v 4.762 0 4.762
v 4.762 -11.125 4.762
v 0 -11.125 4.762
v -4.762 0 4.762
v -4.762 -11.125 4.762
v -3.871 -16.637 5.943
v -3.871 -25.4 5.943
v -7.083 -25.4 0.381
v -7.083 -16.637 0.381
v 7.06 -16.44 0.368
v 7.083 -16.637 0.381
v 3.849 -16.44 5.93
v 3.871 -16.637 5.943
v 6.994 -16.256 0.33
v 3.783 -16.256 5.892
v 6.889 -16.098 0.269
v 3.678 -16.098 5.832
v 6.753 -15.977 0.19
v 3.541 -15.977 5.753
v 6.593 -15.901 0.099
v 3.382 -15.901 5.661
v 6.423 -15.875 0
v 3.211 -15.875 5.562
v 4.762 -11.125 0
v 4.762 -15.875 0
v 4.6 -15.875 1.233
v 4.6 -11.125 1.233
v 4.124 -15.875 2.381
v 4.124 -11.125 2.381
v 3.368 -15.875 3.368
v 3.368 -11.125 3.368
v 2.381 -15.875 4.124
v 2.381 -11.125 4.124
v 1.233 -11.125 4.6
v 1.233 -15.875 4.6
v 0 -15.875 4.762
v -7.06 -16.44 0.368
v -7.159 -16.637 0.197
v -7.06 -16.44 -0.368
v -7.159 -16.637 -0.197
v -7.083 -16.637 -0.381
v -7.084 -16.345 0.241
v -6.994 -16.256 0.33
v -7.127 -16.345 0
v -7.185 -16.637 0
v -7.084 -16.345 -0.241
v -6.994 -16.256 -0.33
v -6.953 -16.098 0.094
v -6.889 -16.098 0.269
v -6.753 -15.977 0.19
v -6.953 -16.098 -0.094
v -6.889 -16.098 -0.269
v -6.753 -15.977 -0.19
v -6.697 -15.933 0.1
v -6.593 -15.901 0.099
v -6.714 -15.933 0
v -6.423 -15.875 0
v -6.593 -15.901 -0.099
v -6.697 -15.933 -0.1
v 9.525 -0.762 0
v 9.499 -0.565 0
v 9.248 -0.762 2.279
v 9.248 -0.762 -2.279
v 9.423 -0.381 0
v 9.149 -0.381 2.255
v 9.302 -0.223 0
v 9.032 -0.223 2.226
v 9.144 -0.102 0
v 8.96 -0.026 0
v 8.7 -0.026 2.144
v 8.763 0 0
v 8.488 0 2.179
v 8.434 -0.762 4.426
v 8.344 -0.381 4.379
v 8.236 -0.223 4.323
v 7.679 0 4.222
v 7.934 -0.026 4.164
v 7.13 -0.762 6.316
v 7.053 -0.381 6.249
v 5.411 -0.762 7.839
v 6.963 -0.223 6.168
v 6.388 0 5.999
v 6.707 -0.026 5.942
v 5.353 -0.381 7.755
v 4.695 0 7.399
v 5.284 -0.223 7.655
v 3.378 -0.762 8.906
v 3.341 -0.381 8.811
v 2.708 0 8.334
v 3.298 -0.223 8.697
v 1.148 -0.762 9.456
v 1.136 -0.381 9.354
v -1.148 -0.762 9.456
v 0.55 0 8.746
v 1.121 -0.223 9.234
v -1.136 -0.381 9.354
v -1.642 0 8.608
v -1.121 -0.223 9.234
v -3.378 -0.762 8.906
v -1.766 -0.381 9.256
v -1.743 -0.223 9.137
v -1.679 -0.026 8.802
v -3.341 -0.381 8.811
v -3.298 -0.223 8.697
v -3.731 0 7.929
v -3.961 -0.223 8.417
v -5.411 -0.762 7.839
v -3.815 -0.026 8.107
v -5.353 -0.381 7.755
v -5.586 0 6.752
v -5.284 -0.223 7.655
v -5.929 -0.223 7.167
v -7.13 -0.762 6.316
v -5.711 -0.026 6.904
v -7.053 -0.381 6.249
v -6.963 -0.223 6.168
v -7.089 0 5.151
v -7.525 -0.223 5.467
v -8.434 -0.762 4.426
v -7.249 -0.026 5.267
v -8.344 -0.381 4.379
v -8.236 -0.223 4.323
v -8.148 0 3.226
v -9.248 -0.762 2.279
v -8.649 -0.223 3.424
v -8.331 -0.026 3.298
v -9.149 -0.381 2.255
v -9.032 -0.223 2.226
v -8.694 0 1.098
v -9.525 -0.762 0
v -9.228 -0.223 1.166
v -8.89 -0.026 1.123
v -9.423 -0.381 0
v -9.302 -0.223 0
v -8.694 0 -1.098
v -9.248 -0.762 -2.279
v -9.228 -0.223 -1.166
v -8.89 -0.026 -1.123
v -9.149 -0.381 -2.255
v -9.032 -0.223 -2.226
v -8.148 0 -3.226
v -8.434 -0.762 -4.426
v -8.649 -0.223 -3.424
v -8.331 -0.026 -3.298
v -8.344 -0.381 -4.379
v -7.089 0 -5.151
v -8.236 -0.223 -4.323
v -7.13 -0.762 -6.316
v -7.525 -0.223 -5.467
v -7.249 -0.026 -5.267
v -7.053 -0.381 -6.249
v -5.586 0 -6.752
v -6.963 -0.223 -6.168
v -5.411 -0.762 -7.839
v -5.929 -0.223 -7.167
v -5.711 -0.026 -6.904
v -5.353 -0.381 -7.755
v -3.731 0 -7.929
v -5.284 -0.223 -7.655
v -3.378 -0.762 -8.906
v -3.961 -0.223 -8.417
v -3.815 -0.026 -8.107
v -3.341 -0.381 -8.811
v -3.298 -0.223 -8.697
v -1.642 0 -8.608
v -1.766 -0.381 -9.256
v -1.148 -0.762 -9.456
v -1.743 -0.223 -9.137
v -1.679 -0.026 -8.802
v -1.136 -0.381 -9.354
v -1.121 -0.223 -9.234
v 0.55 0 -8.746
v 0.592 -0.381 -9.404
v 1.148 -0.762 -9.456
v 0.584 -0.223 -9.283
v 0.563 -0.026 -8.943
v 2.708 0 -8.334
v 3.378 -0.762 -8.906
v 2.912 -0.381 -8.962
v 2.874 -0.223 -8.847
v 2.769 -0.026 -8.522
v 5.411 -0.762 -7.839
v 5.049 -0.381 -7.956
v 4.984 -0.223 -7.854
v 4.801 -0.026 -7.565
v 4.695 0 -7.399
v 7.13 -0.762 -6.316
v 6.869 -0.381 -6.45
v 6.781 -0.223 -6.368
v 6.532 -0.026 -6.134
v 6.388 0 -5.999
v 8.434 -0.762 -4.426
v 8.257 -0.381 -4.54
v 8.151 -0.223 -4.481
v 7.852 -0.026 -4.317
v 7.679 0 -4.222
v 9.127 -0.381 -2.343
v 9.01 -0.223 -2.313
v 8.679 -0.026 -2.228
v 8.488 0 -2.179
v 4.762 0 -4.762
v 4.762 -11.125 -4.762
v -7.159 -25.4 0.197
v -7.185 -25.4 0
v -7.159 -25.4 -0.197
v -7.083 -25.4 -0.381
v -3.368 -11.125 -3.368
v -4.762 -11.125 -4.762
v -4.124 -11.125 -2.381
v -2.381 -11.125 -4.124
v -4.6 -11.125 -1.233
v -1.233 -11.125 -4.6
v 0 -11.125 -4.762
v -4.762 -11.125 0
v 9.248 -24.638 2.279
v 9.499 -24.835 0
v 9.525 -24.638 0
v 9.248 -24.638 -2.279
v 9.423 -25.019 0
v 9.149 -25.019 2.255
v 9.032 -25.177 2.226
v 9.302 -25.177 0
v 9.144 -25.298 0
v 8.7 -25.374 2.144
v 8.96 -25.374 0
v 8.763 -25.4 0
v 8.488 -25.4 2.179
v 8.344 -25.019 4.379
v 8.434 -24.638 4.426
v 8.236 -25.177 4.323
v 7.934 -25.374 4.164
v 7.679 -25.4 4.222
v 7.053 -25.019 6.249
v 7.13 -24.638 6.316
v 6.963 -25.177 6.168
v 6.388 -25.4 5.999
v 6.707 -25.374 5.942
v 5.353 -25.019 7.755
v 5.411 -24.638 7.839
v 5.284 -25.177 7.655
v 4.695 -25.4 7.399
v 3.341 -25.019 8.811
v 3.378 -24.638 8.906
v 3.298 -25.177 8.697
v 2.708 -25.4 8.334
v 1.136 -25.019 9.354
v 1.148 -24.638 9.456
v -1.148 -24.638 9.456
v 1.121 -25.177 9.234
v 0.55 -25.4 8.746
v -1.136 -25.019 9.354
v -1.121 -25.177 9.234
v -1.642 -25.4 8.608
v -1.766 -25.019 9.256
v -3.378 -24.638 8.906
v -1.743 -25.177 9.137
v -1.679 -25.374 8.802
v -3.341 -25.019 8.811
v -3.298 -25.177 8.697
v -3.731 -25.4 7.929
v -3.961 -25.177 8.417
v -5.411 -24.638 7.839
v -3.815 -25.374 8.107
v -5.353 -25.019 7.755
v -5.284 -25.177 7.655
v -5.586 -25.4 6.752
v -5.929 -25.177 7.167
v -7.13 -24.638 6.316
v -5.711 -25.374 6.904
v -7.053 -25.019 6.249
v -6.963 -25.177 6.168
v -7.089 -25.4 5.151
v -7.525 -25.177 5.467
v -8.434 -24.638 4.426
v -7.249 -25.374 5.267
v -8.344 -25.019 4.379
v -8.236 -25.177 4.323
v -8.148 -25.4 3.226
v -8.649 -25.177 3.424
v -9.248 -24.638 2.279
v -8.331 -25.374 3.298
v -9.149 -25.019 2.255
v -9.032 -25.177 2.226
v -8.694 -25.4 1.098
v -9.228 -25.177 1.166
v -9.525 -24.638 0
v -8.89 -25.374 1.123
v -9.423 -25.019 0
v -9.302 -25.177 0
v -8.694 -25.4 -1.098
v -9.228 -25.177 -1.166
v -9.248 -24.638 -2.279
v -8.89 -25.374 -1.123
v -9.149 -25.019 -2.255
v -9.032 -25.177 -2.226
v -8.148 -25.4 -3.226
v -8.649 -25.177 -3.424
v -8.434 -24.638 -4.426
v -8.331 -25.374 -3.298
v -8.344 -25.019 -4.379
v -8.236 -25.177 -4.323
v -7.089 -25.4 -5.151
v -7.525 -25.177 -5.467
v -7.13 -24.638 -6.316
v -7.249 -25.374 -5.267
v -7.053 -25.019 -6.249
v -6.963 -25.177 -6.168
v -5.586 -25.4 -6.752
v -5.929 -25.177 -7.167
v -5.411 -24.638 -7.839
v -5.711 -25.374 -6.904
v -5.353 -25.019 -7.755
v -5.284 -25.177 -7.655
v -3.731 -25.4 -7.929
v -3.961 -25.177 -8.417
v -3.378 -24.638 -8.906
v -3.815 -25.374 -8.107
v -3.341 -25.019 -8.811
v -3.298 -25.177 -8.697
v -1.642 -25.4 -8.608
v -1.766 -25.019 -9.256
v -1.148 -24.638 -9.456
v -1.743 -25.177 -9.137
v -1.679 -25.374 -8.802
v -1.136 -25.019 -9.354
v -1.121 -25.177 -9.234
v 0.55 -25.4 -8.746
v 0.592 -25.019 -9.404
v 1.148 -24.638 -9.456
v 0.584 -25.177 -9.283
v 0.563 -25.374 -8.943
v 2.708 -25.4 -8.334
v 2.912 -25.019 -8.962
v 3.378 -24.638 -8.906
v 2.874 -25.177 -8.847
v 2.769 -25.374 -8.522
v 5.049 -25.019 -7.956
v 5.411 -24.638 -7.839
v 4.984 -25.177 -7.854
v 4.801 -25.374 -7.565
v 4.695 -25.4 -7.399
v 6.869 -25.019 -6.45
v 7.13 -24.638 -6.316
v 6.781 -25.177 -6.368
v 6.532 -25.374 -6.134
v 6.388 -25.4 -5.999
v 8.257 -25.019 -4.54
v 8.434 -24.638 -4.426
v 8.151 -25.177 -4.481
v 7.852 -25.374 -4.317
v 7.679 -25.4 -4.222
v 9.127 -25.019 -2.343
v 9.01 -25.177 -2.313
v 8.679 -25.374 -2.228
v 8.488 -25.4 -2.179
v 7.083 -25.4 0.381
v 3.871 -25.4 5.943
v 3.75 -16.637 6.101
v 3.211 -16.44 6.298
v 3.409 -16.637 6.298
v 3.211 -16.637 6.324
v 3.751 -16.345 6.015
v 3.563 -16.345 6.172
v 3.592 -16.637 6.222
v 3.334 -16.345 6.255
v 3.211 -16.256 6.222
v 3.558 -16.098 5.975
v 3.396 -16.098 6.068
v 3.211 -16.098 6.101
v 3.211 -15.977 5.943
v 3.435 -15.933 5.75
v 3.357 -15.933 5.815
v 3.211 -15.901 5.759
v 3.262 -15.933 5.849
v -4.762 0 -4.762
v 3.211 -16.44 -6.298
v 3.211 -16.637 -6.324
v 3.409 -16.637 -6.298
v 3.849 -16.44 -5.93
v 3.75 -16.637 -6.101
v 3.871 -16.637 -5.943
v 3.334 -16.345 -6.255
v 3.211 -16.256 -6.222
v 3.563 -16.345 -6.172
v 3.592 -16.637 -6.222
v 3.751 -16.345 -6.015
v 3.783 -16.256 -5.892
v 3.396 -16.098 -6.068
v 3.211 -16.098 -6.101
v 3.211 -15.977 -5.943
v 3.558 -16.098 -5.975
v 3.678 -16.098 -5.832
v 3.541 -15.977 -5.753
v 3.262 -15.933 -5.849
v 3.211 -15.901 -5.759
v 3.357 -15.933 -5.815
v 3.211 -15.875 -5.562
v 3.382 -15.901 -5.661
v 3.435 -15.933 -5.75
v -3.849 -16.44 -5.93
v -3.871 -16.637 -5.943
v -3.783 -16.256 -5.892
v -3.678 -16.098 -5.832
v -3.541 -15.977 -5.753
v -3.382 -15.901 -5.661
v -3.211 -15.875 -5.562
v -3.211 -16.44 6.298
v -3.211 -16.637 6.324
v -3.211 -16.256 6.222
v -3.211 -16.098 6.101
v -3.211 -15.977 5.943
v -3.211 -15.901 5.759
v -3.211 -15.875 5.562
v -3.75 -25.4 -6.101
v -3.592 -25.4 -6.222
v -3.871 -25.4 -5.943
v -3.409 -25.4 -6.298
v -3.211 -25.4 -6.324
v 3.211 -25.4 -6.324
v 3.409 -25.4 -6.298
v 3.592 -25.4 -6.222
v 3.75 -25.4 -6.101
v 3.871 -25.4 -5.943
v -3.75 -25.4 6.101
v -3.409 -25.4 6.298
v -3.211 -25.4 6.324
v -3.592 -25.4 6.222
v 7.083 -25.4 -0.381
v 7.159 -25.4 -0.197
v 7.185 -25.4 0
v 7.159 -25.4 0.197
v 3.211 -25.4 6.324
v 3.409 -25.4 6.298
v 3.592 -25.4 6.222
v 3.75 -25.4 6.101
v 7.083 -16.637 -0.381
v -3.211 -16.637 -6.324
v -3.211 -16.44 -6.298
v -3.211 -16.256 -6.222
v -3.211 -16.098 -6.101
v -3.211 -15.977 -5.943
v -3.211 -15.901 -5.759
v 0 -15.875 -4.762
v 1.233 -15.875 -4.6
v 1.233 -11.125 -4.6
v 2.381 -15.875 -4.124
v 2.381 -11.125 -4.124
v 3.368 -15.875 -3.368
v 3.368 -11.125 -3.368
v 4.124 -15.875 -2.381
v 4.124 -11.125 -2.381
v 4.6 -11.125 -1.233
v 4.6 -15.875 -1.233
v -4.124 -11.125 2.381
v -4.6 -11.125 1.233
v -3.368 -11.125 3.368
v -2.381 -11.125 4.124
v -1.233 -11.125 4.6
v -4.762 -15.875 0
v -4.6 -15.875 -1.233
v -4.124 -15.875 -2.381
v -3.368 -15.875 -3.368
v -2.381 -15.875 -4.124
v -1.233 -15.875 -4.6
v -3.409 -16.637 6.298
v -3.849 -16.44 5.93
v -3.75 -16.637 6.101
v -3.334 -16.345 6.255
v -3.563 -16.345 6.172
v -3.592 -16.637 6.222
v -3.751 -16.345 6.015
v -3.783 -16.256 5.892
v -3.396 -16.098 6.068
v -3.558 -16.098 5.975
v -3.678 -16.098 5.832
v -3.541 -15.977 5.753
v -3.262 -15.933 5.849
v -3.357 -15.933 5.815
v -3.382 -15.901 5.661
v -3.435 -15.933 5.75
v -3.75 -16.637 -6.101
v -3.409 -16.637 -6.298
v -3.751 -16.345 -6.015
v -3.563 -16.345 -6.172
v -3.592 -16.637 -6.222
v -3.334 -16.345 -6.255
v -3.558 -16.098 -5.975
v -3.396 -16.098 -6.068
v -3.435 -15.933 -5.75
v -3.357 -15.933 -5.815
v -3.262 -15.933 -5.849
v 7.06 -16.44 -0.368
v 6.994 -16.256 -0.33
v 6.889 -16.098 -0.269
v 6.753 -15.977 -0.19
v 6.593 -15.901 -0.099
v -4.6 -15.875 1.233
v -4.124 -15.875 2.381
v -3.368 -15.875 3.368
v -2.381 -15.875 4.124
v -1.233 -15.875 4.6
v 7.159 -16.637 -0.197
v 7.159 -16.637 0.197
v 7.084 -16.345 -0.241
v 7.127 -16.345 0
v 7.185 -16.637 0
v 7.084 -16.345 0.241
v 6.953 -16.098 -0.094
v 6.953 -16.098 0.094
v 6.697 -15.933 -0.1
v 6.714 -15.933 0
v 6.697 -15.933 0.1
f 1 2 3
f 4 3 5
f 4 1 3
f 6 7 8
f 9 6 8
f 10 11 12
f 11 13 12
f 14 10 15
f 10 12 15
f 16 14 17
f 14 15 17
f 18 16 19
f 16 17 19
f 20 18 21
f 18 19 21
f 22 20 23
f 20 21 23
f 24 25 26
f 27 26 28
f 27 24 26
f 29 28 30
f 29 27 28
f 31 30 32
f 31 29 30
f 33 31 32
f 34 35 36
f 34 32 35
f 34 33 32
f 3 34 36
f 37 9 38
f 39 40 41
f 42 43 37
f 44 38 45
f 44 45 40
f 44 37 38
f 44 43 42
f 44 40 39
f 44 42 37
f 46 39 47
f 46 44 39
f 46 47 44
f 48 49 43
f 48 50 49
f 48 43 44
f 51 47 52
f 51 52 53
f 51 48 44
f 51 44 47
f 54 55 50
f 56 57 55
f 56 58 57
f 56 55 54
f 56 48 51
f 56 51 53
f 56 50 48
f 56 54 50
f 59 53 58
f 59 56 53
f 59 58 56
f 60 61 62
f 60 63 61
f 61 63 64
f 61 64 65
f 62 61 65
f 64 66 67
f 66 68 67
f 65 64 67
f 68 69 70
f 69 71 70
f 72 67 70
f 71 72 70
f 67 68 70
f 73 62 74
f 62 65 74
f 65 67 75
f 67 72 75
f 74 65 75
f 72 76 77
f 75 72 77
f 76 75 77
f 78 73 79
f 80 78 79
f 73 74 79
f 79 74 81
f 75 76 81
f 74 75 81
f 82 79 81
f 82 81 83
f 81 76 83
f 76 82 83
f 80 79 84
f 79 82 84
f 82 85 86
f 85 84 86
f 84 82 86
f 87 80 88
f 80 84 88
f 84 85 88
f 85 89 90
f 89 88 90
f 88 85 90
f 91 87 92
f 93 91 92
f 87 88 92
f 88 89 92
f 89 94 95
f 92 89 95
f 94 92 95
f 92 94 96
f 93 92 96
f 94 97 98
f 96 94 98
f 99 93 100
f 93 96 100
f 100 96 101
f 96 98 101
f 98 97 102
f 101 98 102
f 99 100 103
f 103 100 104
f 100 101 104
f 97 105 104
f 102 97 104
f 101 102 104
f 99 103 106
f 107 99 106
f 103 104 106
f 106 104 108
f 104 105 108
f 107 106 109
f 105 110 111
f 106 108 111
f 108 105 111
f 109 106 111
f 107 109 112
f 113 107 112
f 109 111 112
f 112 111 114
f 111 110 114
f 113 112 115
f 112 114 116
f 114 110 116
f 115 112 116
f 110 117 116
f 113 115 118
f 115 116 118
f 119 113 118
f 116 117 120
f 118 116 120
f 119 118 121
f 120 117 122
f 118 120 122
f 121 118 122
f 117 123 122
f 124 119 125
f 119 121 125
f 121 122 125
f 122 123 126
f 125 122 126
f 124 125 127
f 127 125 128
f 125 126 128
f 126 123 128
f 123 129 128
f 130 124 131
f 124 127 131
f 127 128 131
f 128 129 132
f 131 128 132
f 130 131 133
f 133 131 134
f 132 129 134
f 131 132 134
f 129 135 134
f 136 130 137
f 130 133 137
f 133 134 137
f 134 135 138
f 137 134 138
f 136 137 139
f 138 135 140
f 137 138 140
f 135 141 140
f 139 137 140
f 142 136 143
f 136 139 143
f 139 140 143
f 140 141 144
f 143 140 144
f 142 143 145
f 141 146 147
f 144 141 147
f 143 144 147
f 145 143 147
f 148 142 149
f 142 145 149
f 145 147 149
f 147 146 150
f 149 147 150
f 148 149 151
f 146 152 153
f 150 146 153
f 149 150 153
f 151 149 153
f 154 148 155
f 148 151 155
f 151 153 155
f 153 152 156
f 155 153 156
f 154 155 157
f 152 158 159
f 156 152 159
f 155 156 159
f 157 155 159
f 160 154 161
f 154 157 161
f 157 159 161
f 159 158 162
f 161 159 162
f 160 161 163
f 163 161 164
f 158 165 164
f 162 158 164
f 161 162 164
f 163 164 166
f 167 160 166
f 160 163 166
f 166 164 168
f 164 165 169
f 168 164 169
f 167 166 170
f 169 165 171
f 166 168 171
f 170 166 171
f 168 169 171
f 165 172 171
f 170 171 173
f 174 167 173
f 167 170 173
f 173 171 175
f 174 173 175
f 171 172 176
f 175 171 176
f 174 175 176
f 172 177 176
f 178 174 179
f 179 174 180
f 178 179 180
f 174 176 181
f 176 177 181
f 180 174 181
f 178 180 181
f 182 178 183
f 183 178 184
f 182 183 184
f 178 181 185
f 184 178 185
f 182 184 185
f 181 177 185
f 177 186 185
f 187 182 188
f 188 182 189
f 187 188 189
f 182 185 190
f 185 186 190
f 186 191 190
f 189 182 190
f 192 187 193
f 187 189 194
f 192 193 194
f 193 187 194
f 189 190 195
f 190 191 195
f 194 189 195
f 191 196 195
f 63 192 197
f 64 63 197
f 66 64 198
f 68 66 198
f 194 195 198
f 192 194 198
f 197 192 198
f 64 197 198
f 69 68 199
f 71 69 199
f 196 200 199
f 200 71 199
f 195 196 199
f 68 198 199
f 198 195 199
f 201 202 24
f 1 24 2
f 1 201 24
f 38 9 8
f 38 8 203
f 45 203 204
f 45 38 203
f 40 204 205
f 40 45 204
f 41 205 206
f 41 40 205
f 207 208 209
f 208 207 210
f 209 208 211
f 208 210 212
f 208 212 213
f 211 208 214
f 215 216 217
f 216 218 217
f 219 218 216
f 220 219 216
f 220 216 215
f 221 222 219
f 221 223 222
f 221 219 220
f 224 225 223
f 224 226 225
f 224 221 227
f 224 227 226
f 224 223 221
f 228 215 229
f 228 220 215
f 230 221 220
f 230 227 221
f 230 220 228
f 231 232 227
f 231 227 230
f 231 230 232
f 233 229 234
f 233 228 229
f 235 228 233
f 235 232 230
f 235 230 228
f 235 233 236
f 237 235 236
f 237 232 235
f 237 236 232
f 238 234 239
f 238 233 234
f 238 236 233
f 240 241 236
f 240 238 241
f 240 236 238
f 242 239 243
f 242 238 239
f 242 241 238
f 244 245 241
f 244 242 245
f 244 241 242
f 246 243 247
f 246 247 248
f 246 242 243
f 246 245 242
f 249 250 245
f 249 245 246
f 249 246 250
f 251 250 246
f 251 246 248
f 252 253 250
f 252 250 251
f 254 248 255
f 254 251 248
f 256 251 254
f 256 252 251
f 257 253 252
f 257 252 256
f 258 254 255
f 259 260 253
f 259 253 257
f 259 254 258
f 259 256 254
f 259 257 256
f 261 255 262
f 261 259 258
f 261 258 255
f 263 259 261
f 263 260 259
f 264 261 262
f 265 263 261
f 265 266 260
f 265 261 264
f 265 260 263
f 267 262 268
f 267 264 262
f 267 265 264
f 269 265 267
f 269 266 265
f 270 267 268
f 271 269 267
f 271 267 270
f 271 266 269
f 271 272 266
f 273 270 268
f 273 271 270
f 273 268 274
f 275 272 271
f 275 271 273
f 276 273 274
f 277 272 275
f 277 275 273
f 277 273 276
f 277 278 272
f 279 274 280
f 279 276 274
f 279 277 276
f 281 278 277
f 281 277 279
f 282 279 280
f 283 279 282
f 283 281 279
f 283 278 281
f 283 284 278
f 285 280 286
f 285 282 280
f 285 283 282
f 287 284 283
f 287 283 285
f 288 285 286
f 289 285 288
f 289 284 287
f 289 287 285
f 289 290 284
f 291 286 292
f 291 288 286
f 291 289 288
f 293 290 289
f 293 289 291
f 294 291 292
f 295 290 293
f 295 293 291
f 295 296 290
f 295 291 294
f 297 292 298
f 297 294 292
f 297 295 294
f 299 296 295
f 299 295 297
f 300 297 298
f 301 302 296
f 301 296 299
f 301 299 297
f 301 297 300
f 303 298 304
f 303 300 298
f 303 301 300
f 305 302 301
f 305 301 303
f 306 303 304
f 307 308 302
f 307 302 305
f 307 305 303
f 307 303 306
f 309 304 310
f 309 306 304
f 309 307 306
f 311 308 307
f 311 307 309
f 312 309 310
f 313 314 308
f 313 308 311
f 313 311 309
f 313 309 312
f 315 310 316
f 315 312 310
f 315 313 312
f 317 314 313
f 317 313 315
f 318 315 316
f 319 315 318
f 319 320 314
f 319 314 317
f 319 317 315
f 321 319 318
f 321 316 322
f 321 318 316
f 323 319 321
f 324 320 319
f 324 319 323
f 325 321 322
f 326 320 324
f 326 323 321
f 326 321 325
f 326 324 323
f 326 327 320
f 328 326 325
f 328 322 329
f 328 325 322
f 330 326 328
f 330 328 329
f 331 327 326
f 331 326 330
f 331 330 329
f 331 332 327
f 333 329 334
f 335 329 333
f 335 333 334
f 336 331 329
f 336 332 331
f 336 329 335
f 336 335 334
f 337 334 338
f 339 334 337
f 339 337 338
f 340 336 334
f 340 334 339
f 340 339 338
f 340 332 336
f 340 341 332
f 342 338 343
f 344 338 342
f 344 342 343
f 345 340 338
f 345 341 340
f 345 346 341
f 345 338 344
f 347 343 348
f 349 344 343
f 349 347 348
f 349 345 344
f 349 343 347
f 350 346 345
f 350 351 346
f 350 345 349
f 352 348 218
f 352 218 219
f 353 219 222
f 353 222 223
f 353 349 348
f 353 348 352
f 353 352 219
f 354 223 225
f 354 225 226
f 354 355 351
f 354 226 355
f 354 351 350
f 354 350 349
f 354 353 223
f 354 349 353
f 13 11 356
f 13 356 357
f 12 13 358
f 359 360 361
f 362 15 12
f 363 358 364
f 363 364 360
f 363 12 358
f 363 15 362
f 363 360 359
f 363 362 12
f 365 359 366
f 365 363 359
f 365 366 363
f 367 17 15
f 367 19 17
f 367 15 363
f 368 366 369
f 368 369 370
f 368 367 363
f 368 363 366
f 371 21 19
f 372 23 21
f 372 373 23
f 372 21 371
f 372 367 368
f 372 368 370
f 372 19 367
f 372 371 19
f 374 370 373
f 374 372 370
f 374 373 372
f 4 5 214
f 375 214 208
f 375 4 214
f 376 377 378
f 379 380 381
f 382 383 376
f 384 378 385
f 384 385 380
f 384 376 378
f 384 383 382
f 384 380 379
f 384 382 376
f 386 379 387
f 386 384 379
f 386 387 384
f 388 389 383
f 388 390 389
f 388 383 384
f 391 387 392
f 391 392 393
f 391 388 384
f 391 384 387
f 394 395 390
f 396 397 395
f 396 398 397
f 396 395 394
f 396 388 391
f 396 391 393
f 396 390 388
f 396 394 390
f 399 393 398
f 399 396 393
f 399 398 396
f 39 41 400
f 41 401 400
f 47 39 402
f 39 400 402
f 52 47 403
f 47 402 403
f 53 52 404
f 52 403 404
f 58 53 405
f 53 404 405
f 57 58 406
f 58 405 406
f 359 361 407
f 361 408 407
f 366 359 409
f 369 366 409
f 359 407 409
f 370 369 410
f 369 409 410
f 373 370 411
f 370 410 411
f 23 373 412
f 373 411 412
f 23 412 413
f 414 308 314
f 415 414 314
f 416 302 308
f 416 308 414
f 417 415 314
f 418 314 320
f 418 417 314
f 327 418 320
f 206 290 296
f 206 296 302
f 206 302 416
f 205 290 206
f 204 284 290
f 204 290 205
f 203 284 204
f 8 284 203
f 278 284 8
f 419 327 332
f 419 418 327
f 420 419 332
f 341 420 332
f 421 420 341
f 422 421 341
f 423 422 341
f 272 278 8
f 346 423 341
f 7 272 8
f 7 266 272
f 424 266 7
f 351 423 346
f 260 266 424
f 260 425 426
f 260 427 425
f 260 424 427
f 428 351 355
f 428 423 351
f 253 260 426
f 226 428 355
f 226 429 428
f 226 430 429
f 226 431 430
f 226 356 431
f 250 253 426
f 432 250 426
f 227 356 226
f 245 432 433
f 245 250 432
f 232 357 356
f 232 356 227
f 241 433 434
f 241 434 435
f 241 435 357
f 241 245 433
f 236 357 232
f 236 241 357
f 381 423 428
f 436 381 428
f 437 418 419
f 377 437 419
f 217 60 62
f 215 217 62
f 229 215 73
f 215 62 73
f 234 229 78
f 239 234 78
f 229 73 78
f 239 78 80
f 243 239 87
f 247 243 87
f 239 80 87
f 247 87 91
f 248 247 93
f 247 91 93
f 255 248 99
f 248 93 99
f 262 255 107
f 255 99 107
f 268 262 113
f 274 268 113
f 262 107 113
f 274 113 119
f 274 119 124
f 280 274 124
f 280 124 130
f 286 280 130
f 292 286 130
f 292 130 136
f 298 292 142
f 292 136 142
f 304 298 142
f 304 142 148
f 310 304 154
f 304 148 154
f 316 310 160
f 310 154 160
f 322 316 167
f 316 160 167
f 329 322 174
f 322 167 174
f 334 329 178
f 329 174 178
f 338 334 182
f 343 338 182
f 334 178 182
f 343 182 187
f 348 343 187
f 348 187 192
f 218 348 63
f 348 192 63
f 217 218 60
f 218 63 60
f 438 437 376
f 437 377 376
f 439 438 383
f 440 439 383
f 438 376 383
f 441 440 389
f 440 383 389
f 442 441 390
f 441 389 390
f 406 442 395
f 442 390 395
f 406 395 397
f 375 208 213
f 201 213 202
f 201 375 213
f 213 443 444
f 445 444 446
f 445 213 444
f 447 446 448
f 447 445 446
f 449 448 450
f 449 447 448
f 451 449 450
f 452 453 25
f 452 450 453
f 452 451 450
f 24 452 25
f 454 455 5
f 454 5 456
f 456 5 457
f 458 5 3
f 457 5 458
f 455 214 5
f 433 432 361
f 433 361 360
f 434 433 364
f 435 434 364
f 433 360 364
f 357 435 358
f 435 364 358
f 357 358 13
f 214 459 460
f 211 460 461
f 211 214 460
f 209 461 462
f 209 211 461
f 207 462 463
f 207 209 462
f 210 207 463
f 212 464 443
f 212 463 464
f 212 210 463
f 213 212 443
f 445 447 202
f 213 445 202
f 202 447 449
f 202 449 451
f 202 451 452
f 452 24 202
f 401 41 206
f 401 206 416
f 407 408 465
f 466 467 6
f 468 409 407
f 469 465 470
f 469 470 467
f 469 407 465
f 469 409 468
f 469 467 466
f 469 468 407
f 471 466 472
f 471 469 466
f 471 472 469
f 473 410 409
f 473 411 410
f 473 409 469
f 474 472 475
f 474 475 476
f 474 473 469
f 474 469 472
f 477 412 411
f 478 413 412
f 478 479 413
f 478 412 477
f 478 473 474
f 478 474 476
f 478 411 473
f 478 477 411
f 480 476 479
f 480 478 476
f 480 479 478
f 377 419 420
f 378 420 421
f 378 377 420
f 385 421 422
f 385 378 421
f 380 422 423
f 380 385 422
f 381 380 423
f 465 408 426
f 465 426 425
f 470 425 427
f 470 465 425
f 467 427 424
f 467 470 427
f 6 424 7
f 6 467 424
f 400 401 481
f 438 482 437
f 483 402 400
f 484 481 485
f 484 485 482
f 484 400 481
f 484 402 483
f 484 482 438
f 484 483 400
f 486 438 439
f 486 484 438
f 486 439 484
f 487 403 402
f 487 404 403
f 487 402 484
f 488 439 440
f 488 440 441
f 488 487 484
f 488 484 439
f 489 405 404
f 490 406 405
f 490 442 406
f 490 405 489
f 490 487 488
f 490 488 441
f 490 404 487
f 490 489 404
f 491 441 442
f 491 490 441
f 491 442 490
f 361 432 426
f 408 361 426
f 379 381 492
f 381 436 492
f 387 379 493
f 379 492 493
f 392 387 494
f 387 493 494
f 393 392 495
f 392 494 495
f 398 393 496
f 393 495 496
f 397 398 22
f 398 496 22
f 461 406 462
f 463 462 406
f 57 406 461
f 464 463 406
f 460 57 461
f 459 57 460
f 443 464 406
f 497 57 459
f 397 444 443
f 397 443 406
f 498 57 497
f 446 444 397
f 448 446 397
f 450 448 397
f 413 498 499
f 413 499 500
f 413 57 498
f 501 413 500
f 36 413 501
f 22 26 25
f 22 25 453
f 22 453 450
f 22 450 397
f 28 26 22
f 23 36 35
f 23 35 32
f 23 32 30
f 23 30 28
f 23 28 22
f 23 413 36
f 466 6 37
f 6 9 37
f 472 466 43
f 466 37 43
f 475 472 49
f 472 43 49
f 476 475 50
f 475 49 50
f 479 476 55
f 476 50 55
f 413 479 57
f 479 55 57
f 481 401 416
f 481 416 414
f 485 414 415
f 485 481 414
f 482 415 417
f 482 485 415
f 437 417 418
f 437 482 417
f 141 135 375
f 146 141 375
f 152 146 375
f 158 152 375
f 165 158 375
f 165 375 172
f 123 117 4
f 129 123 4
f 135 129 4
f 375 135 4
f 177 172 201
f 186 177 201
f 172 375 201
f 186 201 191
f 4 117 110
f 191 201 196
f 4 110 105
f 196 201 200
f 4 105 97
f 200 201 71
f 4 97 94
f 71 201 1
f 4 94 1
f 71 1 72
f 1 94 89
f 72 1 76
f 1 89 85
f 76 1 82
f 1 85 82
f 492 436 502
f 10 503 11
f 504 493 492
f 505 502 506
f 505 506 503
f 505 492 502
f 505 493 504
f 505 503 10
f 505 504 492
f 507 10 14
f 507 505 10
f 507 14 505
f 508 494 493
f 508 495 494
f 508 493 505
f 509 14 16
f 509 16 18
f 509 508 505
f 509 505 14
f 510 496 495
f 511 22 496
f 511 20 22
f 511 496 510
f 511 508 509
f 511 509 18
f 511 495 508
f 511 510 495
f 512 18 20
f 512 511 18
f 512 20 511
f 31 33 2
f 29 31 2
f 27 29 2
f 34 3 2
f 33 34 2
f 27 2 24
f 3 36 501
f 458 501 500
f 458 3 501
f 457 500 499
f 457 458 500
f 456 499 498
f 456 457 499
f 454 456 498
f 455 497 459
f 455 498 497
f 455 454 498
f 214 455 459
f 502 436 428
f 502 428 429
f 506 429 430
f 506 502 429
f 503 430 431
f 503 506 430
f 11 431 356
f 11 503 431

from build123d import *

# Parameters (mm, degrees)
F0_R     = 9.525
F1_DEPTH = 25.4
F3_DEPTH = 25.401
F4_DEPTH = 11.1252
F6_DEPTH = 9.525
F7_R     = 0.762
F8_R     = 0.762
F9_R     = 0.762


with BuildPart() as f1:
    # F0 (on Front) → F1 (new body)
    with BuildSketch(Plane.XZ):
        Circle(F0_R)
    extrude(amount=F1_DEPTH)

    # F2 (on Front) → F3 (cut, through all)
    with BuildSketch(Plane.XZ):
        with BuildLine():
            ThreePointArc((4.7625, 0), (3.367596, 3.367596), (0, 4.7625))
            ThreePointArc((0, 4.7625), (-3.367596, 3.367596), (-4.7625, 0))
            ThreePointArc((-4.7625, 0), (-3.367596, -3.367596), (0, -4.7625))
            ThreePointArc((0, -4.7625), (3.367596, -3.367596), (4.7625, 0))
        make_face()
    extrude(amount=F3_DEPTH, mode=Mode.SUBTRACT)

    # F2 (on Front) → F4 (cut)
    with BuildSketch(Plane.XZ):
        with BuildLine():
            Line((0, 4.7625), (-4.7625, 4.7625))
            Line((-4.7625, 4.7625), (-4.7625, 0))
            ThreePointArc((-4.7625, 0), (-3.367596, 3.367596), (0, 4.7625))
        make_face()
        with BuildLine():
            Line((4.7625, 4.7625), (0, 4.7625))
            ThreePointArc((0, 4.7625), (3.367596, 3.367596), (4.7625, 0))
            Line((4.7625, 0), (4.7625, 4.7625))
        make_face()
        with BuildLine():
            ThreePointArc((0, -4.7625), (-3.367596, -3.367596), (-4.7625, 0))
            Line((-4.7625, 0), (-4.7625, -4.7625))
            Line((-4.7625, -4.7625), (0, -4.7625))
        make_face()
        with BuildLine():
            Line((4.7625, -4.7625), (4.7625, 0))
            ThreePointArc((4.7625, 0), (3.367596, -3.367596), (0, -4.7625))
            Line((0, -4.7625), (4.7625, -4.7625))
        make_face()
    extrude(amount=F4_DEPTH, mode=Mode.SUBTRACT)

    # F5 (on face) → F6 (cut)
    with BuildSketch(Plane.XZ.offset(25.4)):
        Polygon((3.65125, 6.324151), (-3.65125, 6.324151), (-7.3025, 0), (-3.65125, -6.324151), (3.65125, -6.324151), (7.3025, 0), align=None)
    extrude(amount=-F6_DEPTH, mode=Mode.SUBTRACT)

    # F7
    f7_edges = [f1.edges().sort_by_distance(p)[0] for p in [
        (-9.525, 0, 0),
        (-9.525, -25.4, 0),
    ]]
    fillet(f7_edges, radius=F7_R)

    # F8
    f8_edges = [f1.edges().sort_by_distance(p)[0] for p in [
        (3.65125, -20.6375, 6.324151),
        (3.65125, -20.6375, -6.324151),
        (-3.65125, -20.6375, -6.324151),
        (-7.3025, -20.6375, 0),
        (-3.65125, -20.6375, 6.324151),
        (7.3025, -20.6375, 0),
    ]]
    fillet(f8_edges, radius=F8_R)

    # F9
    f9_edges = [f1.edges().sort_by_distance(p)[0] for p in [
        (0, -15.875, 6.324151),
    ]]
    fillet(f9_edges, radius=F9_R)


solid = f1.part
